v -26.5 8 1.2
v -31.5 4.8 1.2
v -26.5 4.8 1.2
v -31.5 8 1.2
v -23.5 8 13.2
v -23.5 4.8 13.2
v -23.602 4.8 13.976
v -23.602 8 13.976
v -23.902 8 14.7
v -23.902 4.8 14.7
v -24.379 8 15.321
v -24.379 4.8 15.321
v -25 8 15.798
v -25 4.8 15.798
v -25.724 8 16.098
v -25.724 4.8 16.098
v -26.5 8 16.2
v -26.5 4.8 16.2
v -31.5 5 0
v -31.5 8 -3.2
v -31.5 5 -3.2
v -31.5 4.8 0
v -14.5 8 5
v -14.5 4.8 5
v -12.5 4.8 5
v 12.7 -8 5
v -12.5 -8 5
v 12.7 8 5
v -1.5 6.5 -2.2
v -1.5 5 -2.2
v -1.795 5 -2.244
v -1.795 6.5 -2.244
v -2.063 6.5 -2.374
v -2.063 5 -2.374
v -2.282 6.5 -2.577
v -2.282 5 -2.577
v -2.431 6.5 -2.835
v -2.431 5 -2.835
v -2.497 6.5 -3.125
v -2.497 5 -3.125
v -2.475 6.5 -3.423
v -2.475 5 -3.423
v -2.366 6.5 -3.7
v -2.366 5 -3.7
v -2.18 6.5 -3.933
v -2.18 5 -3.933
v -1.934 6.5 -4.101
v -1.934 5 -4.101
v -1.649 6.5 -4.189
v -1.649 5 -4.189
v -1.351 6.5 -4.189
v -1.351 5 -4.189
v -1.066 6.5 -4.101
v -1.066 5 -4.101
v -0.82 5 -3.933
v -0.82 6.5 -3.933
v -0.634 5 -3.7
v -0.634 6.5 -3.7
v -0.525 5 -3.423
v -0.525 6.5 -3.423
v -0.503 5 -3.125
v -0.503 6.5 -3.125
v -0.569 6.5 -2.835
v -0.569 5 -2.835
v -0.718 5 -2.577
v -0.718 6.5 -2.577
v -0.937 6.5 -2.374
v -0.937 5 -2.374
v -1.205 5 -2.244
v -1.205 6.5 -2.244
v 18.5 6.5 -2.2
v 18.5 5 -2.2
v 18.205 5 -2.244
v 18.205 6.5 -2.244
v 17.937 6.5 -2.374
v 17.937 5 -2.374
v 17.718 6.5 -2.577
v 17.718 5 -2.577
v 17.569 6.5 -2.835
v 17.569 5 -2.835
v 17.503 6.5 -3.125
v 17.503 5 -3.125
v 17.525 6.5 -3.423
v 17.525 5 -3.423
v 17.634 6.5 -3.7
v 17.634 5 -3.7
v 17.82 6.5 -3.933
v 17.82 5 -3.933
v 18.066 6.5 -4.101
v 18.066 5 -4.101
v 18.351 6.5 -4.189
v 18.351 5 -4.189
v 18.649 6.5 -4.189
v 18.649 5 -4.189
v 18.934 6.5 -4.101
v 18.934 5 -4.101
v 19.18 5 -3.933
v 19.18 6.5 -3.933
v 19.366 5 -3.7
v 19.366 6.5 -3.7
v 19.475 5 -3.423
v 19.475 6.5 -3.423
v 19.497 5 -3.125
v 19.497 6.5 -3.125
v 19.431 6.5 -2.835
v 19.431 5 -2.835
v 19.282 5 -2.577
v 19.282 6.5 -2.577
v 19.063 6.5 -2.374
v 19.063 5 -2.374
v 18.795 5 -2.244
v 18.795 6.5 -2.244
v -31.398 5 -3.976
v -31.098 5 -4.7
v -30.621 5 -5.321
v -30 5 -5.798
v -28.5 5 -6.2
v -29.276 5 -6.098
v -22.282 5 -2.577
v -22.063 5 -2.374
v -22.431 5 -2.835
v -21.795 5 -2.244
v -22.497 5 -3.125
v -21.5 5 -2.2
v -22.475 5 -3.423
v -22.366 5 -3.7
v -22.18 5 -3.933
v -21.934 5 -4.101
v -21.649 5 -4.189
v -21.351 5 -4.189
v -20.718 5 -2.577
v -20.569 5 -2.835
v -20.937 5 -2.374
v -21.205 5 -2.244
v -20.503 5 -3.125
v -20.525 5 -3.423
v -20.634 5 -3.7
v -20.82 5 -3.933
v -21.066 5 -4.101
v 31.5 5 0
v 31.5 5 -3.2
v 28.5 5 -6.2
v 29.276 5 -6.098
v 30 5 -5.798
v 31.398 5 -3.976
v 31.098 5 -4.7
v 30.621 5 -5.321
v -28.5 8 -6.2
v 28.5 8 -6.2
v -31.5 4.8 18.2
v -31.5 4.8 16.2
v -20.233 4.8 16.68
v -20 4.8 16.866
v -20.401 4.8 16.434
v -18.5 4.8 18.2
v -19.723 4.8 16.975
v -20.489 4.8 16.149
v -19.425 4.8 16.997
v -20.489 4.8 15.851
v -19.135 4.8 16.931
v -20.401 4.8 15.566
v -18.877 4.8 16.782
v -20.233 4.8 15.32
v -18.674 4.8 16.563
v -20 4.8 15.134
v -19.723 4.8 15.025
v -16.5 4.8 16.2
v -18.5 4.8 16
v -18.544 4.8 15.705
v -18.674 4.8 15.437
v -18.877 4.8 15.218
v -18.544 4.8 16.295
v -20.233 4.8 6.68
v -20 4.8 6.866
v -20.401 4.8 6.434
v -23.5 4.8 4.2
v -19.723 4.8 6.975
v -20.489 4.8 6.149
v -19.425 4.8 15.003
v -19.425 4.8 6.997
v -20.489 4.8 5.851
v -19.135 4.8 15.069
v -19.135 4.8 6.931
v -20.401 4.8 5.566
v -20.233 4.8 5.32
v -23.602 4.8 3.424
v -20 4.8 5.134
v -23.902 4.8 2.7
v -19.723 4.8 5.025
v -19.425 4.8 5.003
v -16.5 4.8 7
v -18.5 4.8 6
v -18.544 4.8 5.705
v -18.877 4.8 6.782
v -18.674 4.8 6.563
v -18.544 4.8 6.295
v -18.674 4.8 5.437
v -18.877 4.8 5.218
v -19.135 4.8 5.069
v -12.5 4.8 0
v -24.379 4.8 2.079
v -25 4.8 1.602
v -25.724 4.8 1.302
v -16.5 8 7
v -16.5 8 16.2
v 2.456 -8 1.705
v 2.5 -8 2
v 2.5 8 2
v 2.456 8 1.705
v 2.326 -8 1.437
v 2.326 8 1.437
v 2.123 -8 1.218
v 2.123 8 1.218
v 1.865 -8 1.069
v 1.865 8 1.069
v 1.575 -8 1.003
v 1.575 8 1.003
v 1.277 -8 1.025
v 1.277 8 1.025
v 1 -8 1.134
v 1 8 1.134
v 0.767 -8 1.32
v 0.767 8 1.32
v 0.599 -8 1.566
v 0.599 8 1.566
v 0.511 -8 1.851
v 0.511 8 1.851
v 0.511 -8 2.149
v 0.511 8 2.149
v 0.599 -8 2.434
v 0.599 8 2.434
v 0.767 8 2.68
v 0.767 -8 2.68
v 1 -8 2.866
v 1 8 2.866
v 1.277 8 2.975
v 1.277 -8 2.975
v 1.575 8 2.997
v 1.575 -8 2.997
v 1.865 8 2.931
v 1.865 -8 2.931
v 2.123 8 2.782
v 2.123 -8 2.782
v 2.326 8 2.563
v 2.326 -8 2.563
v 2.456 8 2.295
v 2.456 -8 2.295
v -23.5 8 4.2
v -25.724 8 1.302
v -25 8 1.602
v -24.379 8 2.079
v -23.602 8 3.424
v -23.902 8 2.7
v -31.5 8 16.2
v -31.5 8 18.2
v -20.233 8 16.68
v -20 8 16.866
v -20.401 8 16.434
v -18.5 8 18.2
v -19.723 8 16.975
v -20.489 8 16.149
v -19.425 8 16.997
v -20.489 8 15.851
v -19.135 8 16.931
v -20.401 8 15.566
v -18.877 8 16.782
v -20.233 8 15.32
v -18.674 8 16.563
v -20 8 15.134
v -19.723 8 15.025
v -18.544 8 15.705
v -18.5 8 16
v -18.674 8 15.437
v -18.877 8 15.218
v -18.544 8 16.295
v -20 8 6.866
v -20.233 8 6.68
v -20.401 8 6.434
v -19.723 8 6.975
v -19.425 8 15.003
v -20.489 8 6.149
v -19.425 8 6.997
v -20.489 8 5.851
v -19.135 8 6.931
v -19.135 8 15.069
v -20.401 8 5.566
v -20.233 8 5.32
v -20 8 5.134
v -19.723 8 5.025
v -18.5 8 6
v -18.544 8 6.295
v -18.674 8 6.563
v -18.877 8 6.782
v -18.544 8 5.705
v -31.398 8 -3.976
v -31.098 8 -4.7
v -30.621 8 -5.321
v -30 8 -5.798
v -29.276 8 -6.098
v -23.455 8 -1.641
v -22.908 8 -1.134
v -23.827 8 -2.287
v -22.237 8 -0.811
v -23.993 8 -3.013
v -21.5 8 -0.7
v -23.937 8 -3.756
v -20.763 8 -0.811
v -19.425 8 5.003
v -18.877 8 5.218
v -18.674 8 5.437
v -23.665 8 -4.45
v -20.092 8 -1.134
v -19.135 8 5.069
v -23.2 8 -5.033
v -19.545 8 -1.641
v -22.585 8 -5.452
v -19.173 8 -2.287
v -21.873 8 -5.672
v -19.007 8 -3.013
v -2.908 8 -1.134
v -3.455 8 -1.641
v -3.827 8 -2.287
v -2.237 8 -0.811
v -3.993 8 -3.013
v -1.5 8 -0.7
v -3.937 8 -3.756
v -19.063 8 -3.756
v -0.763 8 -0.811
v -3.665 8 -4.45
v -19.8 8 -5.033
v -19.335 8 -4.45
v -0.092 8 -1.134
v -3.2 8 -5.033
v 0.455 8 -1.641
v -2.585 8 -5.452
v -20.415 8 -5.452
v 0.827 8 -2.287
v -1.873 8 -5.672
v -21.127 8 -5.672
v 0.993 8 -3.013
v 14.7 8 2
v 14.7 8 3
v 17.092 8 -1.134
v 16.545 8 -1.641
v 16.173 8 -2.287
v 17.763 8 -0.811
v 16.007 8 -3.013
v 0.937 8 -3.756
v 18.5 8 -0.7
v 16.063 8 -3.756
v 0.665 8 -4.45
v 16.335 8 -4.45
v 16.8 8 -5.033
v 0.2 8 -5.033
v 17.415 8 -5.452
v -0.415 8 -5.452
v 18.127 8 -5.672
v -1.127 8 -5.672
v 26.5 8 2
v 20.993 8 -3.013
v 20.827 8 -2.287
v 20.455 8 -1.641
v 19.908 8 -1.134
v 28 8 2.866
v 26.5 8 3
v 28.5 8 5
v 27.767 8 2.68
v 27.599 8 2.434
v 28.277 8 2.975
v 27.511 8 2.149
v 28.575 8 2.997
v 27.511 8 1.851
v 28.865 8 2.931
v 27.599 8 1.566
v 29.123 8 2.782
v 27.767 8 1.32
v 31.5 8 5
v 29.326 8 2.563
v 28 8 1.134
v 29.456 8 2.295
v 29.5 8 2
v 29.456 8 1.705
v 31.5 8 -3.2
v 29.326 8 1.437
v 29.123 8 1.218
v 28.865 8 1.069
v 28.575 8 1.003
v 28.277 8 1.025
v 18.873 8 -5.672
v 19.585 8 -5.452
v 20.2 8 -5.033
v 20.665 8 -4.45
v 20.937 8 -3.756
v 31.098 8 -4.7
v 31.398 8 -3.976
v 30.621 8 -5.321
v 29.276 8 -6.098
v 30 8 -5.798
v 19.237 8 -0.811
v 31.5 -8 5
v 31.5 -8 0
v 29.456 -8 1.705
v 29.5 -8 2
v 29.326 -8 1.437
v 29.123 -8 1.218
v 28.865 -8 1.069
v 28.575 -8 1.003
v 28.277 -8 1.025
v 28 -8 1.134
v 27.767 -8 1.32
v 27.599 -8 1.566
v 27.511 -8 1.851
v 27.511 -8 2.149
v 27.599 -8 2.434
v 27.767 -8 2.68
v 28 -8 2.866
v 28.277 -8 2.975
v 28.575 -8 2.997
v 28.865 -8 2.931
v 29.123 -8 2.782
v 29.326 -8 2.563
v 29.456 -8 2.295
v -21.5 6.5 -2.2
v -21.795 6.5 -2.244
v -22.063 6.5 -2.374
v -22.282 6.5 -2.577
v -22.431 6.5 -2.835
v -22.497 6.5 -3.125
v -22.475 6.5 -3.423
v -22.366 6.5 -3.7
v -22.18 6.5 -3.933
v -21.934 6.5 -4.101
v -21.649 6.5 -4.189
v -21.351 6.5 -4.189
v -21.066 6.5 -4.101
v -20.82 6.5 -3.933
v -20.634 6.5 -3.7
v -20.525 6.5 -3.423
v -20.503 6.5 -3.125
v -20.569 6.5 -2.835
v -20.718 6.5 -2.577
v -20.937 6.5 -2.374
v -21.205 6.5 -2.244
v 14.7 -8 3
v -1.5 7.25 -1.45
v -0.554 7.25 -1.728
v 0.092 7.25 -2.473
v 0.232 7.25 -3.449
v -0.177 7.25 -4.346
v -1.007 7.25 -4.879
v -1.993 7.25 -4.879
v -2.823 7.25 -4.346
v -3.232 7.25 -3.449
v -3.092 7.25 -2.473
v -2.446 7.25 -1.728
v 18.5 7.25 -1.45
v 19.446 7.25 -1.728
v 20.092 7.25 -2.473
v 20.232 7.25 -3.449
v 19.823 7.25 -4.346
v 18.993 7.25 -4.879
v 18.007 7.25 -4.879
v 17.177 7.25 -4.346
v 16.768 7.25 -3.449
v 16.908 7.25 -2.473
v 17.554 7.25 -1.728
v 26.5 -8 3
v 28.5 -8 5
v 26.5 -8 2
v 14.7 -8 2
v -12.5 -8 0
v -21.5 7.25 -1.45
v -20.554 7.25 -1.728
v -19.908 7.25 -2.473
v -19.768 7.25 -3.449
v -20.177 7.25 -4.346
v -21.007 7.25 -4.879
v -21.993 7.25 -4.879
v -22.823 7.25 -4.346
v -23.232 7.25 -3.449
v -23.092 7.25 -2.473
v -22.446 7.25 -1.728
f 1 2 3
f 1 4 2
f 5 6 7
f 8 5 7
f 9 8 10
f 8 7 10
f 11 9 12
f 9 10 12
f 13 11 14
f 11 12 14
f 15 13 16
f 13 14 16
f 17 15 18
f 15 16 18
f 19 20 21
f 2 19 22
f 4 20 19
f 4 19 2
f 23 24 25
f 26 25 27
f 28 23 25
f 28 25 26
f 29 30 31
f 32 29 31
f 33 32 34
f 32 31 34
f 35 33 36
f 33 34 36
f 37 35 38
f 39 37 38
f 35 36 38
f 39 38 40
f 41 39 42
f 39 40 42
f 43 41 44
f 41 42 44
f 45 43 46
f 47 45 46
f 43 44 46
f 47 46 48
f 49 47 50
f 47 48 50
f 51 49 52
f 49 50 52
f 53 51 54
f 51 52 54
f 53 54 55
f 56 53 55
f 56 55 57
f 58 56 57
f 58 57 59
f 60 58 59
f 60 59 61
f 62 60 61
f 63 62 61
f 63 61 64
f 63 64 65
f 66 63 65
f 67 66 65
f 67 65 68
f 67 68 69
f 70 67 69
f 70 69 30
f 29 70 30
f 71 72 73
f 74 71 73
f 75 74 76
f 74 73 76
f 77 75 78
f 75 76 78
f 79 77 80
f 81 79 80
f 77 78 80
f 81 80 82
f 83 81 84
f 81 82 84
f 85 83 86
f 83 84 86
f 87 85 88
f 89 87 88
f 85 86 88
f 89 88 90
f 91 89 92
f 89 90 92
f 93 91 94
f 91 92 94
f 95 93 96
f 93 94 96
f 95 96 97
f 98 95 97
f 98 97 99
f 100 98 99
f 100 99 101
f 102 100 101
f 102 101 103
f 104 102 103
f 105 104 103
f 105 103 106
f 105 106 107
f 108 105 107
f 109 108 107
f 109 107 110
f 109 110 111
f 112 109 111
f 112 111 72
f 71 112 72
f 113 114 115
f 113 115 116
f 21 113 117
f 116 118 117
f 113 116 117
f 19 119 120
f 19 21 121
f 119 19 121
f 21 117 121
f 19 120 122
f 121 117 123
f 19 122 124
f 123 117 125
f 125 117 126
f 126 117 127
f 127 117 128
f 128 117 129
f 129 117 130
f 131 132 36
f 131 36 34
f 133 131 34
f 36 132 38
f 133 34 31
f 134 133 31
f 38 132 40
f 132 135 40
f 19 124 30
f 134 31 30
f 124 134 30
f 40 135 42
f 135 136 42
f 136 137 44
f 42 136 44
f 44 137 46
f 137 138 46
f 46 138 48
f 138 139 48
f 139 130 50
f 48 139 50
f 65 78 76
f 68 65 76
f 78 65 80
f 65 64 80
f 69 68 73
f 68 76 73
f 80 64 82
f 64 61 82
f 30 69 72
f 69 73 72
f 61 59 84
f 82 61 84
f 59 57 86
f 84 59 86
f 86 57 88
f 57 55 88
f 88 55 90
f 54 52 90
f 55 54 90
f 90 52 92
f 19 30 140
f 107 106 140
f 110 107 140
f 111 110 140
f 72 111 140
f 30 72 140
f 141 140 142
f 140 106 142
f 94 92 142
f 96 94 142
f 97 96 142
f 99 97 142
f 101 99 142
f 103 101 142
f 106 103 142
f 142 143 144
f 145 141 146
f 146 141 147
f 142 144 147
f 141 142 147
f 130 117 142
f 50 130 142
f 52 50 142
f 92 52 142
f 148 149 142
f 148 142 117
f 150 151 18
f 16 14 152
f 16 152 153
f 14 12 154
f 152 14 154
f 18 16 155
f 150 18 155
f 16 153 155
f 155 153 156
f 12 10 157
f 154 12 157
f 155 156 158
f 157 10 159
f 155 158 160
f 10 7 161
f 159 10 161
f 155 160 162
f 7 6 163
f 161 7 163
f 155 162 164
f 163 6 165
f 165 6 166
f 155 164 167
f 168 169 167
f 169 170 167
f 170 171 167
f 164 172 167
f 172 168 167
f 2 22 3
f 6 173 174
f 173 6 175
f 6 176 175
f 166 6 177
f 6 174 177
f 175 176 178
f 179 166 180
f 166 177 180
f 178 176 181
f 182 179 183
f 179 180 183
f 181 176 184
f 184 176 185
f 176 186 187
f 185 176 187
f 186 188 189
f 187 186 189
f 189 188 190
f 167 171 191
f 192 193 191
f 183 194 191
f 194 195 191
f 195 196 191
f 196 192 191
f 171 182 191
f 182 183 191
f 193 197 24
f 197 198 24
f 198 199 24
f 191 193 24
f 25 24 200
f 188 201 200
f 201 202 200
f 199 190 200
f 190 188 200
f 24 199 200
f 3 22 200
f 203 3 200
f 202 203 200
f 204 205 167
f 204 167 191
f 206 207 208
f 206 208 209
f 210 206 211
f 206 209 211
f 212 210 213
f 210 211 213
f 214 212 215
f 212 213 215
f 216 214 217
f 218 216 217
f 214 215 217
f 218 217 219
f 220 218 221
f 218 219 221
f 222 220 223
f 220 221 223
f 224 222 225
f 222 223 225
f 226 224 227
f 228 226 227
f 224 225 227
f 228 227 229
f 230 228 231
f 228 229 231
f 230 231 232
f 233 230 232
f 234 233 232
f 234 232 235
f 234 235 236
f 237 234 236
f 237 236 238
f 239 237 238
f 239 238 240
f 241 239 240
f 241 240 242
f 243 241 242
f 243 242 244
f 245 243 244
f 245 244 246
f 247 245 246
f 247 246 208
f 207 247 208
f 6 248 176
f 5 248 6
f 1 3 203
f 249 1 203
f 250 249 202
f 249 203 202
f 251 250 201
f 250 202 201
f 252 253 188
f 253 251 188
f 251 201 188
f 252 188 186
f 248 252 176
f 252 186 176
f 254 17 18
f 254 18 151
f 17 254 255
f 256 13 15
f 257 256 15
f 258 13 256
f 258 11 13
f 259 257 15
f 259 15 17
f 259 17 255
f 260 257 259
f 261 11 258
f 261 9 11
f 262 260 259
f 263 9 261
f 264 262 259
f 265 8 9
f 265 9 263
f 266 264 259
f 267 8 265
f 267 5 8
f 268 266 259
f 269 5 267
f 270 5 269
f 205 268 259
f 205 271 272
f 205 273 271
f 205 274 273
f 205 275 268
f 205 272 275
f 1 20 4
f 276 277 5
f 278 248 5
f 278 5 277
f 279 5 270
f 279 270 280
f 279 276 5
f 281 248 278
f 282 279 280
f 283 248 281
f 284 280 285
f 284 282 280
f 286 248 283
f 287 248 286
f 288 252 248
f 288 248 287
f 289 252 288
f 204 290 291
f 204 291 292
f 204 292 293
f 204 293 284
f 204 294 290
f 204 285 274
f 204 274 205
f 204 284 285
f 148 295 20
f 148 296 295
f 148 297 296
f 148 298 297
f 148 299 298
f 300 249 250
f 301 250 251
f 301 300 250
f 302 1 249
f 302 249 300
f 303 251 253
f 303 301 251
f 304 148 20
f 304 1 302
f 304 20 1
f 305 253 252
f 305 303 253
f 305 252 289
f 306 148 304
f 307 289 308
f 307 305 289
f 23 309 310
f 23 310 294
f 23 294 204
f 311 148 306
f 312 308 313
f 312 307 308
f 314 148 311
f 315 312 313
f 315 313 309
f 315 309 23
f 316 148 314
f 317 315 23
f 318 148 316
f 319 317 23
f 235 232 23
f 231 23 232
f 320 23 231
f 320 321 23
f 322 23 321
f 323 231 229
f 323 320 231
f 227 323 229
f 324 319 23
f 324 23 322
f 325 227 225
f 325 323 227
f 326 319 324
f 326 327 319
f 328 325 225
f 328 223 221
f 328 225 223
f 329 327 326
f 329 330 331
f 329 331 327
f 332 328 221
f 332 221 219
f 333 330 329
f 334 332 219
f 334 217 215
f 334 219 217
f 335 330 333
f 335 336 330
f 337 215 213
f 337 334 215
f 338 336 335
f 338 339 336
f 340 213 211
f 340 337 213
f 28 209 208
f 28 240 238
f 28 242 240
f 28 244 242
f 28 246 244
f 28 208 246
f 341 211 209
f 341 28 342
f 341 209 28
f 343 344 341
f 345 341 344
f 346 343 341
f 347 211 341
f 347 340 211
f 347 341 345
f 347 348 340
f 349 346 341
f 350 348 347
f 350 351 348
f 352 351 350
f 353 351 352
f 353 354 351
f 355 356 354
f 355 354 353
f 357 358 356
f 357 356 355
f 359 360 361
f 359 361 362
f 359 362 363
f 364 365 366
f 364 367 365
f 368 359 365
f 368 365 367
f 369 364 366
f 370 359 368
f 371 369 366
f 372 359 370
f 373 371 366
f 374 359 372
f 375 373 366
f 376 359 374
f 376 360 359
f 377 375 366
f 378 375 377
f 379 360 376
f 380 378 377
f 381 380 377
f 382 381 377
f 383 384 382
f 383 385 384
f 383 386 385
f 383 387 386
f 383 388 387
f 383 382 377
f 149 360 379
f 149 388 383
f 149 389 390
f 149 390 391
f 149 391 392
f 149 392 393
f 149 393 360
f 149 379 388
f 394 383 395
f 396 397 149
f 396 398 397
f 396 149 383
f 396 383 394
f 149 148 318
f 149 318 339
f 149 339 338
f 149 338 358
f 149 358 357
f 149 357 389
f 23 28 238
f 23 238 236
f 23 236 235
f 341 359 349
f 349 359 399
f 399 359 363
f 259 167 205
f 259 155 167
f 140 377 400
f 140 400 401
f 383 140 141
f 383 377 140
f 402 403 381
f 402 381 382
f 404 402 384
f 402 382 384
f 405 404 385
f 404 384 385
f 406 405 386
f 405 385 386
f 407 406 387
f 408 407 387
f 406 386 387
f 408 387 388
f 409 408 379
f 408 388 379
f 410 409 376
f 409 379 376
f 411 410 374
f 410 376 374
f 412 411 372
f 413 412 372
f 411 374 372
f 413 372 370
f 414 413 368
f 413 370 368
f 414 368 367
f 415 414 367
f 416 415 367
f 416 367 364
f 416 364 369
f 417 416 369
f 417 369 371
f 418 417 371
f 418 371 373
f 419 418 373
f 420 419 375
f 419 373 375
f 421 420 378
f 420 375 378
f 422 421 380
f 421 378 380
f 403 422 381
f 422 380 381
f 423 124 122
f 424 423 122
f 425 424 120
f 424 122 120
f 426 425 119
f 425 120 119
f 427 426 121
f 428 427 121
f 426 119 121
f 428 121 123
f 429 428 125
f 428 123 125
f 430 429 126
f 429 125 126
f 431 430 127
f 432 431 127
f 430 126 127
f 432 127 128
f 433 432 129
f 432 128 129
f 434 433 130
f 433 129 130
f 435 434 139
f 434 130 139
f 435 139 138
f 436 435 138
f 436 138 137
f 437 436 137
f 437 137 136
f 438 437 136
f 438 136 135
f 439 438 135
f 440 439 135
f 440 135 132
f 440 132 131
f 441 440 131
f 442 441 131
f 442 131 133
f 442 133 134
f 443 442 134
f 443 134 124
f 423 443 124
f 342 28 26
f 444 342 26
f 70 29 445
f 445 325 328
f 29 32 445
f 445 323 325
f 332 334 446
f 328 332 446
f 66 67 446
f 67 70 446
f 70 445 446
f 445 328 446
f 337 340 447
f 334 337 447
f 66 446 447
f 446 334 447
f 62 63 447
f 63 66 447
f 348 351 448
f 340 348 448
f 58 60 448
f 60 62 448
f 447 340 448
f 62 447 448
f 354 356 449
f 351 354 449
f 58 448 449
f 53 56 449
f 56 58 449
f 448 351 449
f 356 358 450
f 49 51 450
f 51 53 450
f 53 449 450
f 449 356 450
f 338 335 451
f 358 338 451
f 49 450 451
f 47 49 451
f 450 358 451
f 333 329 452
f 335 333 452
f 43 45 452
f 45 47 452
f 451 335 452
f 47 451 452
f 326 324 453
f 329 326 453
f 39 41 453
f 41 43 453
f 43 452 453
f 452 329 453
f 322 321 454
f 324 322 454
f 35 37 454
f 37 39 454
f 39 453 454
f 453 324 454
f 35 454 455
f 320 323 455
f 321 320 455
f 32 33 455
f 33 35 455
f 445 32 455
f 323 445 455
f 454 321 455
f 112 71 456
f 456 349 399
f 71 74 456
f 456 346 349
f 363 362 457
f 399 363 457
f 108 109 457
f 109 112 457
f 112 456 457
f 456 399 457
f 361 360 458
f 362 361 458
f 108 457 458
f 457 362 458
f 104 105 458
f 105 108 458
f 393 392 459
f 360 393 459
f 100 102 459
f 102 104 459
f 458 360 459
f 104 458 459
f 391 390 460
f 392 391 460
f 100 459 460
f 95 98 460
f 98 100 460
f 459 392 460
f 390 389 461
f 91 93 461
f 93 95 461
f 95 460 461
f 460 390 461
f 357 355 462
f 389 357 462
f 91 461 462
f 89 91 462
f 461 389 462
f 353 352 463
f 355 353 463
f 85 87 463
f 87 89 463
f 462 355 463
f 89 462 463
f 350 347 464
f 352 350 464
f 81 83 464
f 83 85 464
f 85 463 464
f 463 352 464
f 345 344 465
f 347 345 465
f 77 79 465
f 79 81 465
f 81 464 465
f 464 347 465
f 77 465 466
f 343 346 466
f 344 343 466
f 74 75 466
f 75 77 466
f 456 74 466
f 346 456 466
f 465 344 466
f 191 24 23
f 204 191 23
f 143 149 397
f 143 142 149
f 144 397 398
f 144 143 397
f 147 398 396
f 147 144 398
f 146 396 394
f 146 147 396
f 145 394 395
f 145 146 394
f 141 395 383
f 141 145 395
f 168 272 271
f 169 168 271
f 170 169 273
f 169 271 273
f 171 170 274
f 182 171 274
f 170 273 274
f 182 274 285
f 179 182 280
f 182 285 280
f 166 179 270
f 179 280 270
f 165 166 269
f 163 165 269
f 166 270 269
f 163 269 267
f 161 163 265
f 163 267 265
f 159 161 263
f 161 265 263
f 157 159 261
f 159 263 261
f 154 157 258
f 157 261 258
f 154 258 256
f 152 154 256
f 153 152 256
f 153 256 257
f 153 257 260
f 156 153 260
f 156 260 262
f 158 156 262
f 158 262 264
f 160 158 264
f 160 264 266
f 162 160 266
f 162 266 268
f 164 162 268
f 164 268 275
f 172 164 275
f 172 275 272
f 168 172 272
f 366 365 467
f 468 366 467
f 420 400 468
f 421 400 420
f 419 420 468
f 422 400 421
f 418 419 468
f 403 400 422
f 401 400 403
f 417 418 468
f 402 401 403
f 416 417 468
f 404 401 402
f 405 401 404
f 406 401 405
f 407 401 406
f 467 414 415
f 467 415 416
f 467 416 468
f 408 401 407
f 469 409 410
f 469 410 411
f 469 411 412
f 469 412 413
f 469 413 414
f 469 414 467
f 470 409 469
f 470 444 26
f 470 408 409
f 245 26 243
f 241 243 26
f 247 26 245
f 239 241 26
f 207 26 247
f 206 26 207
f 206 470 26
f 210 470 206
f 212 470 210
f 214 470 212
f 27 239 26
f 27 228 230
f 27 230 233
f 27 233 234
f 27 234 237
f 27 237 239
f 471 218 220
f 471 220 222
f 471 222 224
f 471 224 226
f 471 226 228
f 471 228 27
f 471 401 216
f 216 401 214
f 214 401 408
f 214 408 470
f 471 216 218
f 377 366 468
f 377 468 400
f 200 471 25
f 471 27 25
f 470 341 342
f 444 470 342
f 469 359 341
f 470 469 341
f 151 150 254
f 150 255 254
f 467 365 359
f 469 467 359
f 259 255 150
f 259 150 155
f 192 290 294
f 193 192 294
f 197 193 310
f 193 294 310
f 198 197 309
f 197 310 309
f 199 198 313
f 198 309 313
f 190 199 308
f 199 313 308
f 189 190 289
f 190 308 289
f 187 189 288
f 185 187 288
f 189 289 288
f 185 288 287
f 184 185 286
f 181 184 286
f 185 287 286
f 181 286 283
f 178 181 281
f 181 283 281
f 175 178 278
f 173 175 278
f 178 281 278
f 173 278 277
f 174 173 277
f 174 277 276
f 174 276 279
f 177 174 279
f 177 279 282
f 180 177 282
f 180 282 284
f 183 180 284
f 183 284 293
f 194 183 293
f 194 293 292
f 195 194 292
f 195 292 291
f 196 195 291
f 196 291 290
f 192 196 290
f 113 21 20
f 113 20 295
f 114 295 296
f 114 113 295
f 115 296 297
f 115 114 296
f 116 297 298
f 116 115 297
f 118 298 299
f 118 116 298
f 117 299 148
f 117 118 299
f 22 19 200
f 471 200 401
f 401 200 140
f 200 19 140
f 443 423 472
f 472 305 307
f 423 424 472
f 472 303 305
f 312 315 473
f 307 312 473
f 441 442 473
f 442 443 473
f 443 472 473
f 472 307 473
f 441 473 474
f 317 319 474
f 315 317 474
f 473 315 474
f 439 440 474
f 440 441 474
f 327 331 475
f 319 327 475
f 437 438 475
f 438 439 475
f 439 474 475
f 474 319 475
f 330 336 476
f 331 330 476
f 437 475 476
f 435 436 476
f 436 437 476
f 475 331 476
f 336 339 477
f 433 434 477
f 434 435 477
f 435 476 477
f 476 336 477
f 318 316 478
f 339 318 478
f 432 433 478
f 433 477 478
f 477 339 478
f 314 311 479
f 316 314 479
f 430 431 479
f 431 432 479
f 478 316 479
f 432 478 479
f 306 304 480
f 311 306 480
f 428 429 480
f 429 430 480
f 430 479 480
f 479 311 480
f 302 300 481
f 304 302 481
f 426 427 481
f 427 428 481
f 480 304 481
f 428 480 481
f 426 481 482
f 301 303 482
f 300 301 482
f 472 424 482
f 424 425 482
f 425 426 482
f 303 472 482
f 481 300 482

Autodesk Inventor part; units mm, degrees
ref_plane "YZ Plane" through (0, 0, 0) normal (1, 0, 0) x (0, 1, 0)
ref_plane "XZ Plane" through (0, 0, 0) normal (0, 1, 0) x (-1, 0, 0)
ref_plane "XY Plane" through (0, 0, 0) normal (0, 0, 1) x (1, 0, 0)
sketch "Sketch1" plane through (0, 0, 0) normal (0, 0, 1) x (1, 0, 0)
  line L0 (-31.5, 8) -> (31.5, 8)
  line L1 (31.5, 8) -> (31.5, -8)
  line L2 (31.5, -8) -> (-31.5, -8)
  line L3 (-31.5, -8) -> (-31.5, 8)
  point P0 (0, 0)
  dimension "d0" = 16
  dimension "d1" = 8
  dimension "d2" = 63
  dimension "d3" = 31.5
extrude "Extrusion1" add sketch "Sketch1" along normal blind 5
sketch "Sketch2" plane through (-31.5, 8, 0) normal (0, 1, 0) x (1, 0, 0)
  line L0 (0, 0) -> (0, -5) projected
  line L1 (63, 0) -> (0, 0) projected
  circle A0 centre (33, -2) radius 1
  circle A1 centre (60, -2) radius 1
  point P0 (31.5, 0)
  dimension "d6" = 33
  dimension "d7" = 60
  dimension "d8" = 2
  dimension "d9" = 2
  dimension "d10" = 2
  dimension "d11" = 2
extrude "Extrusion2" cut sketch "Sketch2" against normal blind 16
sketch "Sketch4" plane through (0, 0, 5) normal (0, 0, 1) x (1, 0, 0)
  line L0 (-31.5, -8) -> (31.5, -8) projected
  line L1 (-31.5, -8) -> (-12.5, -8)
  line L2 (-12.5, -8) -> (-12.5, 4.8)
  line L3 (-12.5, 4.8) -> (-31.5, 4.8)
  line L4 (-31.5, 4.8) -> (-31.5, -8)
  line L5 (31.5, 8) -> (-31.5, 8) projected
  point P0 (0, 0)
  dimension "d24" = 19
  dimension "d25" = 3.2
extrude "Extrusion4" cut sketch "Sketch4" against normal blind 5
sketch "Sketch5" plane through (-31.5, 8, 0) normal (0, 1, 0) x (1, 0, 0)
  line L0 (0, 0) -> (0, -5) projected
  line L1 (0, -1.2) -> (8, -1.2)
  line L2 (8, -1.2) -> (8, -5)
  line L3 (8, -5) -> (0, -5)
  line L4 (0, -5) -> (0, -1.2)
  line L5 (63, 0) -> (0, 0) projected
  line L6 (63, -5) -> (0, -5) projected
  point P0 (31.5, 0)
  dimension "d28" = 1.2
  dimension "d29" = 8
extrude "Extrusion5" cut sketch "Sketch5" against normal blind 5
sketch "Sketch6" plane through (-31.5, 8, 0) normal (0, 1, 0) x (1, 0, 0)
  line L0 (8, -1.2) -> (0, -1.2) projected
  line L1 (0, -1.2) -> (10, -1.2)
  line L2 (10, -1.2) -> (10, -18.2)
  line L3 (10, -18.2) -> (0, -18.2)
  line L4 (0, -18.2) -> (0, -1.2)
  line L5 (8, -5) -> (10, -5)
  line L6 (10, -5) -> (10, -18.2)
  line L7 (10, -18.2) -> (8, -18.2)
  line L8 (8, -18.2) -> (8, -5)
  line L9 (0, -18.2) -> (8, -18.2)
  line L10 (8, -18.2) -> (8, -16.2)
  line L11 (8, -16.2) -> (0, -16.2)
  line L12 (0, -16.2) -> (0, -18.2)
  line L13 (63, -5) -> (8, -5) projected
  line L14 (8, -1.2) -> (8, -5) projected
  point P0 (31.5, 0)
  point P1 (10, -5)
  point P2 (0, -16.2)
  dimension "d32" = 2
  dimension "d33" = 15
  dimension "d34" = 2
extrude "Extrusion6" add sketch "Sketch6" against normal blind 3.2 contours L5 L2 L3 L8 | L11 L8 L3 L4
sketch "Sketch7" plane through (-31.5, 8, 0) normal (0, 1, 0) x (1, 0, 0)
  line L0 (0, 0) -> (0, -1.2) projected
  line L1 (0, -16.2) -> (0, -18.2) projected
  line L2 (63, 0) -> (0, 0) projected
  circle A0 centre (12, -6) radius 1
  circle A1 centre (12, -16) radius 1
  line L3 (10, -18.2) -> (0, -18.2) projected
  line L4 (10, -5) -> (19, -5) projected
  line L5 (10, -18.2) -> (15, -18.2)
  line L6 (15, -18.2) -> (15, -5)
  line L7 (15, -5) -> (10, -5)
  line L8 (10, -5) -> (10, -18.2)
  point P0 (31.5, 0)
  point P1 (12, -5)
  dimension "d37" = 12
  dimension "d38" = 12
  dimension "d39" = 16
  dimension "d40" = 6
  dimension "d41" = 2
  dimension "d42" = 2
  dimension "d43" = 5
extrude "Extrusion7" add sketch "Sketch7" against normal blind 3.2
chamfer "Chamfer1" distance 2 angle 45 2 edges at (-16.5, 6.4, 18.2) (-16.5, 6.4, 5)
fillet "Fillet1" radius 3 2 edges at (-23.5, 6.4, 1.2) (-23.5, 6.4, 16.2)
sketch "Sketch10" plane through (-31.5, 8, 0) normal (0, 1, 0) x (1, 0, 0)
  line L0 (63, -5) -> (17, -5) projected
  line L1 (46.2, -5) -> (58, -5)
  line L2 (58, -5) -> (58, -2)
  line L3 (58, -2) -> (46.2, -2)
  line L4 (46.2, -2) -> (46.2, -5)
  line L5 (0, 0) -> (0, -1.2) projected
  line L6 (63, 0) -> (0, 0) projected
  point P0 (31.5, 0)
  dimension "d73" = 46.2
  dimension "d74" = 58
  dimension "d75" = 2
extrude "Extrusion9" cut sketch "Sketch10" against normal blind 16
chamfer "Chamfer2" distance 2 angle 45 2 edges at (14.7, 0, 5) (26.5, 0, 5)
sketch "Sketch11" plane through (-31.5, 8, 0) normal (0, 1, 0) x (1, 0, 0)
  line L0 (63, 0) -> (0, 0) projected
  line L1 (0, 0) -> (63, 0)
  line L2 (63, 0) -> (63, 6.2)
  line L3 (63, 6.2) -> (0, 6.2)
  line L4 (0, 6.2) -> (0, 0)
  line L5 (63, 0) -> (63, -5) projected
  point P0 (31.5, 0)
  dimension "d81" = 6.2
extrude "Extrusion10" add sketch "Sketch11" against normal blind 3
sketch "Sketch12" plane through (-31.5, 8, 18.2) normal (0, 1, 0) x (1, 0, 0)
  line L0 (63, 24.4) -> (0, 24.4) projected
  line L1 (0, 24.4) -> (0, 17) projected
  point P0 (31.5, 18.2)
  point P1 (10, 21.4)
  point P2 (30, 21.4)
  point P3 (50, 21.4)
  dimension "d84" = 3
  dimension "d85" = 3
  dimension "d86" = 3
  dimension "d87" = 20
  dimension "d88" = 20
  dimension "d89" = 10
hole "Hole2" at (-21.5, 8, -3.2) at (-1.5, 8, -3.2) at (18.5, 8, -3.2) direction (0, -1, 0) diameter 2 depth 5 tip angle 118 countersink diameter 5 countersink angle 90
fillet "Fillet2" radius 3 2 edges at (31.5, 6.5, -6.2) (-31.5, 6.5, -6.2)
properties part number "bridge_structure_A"
